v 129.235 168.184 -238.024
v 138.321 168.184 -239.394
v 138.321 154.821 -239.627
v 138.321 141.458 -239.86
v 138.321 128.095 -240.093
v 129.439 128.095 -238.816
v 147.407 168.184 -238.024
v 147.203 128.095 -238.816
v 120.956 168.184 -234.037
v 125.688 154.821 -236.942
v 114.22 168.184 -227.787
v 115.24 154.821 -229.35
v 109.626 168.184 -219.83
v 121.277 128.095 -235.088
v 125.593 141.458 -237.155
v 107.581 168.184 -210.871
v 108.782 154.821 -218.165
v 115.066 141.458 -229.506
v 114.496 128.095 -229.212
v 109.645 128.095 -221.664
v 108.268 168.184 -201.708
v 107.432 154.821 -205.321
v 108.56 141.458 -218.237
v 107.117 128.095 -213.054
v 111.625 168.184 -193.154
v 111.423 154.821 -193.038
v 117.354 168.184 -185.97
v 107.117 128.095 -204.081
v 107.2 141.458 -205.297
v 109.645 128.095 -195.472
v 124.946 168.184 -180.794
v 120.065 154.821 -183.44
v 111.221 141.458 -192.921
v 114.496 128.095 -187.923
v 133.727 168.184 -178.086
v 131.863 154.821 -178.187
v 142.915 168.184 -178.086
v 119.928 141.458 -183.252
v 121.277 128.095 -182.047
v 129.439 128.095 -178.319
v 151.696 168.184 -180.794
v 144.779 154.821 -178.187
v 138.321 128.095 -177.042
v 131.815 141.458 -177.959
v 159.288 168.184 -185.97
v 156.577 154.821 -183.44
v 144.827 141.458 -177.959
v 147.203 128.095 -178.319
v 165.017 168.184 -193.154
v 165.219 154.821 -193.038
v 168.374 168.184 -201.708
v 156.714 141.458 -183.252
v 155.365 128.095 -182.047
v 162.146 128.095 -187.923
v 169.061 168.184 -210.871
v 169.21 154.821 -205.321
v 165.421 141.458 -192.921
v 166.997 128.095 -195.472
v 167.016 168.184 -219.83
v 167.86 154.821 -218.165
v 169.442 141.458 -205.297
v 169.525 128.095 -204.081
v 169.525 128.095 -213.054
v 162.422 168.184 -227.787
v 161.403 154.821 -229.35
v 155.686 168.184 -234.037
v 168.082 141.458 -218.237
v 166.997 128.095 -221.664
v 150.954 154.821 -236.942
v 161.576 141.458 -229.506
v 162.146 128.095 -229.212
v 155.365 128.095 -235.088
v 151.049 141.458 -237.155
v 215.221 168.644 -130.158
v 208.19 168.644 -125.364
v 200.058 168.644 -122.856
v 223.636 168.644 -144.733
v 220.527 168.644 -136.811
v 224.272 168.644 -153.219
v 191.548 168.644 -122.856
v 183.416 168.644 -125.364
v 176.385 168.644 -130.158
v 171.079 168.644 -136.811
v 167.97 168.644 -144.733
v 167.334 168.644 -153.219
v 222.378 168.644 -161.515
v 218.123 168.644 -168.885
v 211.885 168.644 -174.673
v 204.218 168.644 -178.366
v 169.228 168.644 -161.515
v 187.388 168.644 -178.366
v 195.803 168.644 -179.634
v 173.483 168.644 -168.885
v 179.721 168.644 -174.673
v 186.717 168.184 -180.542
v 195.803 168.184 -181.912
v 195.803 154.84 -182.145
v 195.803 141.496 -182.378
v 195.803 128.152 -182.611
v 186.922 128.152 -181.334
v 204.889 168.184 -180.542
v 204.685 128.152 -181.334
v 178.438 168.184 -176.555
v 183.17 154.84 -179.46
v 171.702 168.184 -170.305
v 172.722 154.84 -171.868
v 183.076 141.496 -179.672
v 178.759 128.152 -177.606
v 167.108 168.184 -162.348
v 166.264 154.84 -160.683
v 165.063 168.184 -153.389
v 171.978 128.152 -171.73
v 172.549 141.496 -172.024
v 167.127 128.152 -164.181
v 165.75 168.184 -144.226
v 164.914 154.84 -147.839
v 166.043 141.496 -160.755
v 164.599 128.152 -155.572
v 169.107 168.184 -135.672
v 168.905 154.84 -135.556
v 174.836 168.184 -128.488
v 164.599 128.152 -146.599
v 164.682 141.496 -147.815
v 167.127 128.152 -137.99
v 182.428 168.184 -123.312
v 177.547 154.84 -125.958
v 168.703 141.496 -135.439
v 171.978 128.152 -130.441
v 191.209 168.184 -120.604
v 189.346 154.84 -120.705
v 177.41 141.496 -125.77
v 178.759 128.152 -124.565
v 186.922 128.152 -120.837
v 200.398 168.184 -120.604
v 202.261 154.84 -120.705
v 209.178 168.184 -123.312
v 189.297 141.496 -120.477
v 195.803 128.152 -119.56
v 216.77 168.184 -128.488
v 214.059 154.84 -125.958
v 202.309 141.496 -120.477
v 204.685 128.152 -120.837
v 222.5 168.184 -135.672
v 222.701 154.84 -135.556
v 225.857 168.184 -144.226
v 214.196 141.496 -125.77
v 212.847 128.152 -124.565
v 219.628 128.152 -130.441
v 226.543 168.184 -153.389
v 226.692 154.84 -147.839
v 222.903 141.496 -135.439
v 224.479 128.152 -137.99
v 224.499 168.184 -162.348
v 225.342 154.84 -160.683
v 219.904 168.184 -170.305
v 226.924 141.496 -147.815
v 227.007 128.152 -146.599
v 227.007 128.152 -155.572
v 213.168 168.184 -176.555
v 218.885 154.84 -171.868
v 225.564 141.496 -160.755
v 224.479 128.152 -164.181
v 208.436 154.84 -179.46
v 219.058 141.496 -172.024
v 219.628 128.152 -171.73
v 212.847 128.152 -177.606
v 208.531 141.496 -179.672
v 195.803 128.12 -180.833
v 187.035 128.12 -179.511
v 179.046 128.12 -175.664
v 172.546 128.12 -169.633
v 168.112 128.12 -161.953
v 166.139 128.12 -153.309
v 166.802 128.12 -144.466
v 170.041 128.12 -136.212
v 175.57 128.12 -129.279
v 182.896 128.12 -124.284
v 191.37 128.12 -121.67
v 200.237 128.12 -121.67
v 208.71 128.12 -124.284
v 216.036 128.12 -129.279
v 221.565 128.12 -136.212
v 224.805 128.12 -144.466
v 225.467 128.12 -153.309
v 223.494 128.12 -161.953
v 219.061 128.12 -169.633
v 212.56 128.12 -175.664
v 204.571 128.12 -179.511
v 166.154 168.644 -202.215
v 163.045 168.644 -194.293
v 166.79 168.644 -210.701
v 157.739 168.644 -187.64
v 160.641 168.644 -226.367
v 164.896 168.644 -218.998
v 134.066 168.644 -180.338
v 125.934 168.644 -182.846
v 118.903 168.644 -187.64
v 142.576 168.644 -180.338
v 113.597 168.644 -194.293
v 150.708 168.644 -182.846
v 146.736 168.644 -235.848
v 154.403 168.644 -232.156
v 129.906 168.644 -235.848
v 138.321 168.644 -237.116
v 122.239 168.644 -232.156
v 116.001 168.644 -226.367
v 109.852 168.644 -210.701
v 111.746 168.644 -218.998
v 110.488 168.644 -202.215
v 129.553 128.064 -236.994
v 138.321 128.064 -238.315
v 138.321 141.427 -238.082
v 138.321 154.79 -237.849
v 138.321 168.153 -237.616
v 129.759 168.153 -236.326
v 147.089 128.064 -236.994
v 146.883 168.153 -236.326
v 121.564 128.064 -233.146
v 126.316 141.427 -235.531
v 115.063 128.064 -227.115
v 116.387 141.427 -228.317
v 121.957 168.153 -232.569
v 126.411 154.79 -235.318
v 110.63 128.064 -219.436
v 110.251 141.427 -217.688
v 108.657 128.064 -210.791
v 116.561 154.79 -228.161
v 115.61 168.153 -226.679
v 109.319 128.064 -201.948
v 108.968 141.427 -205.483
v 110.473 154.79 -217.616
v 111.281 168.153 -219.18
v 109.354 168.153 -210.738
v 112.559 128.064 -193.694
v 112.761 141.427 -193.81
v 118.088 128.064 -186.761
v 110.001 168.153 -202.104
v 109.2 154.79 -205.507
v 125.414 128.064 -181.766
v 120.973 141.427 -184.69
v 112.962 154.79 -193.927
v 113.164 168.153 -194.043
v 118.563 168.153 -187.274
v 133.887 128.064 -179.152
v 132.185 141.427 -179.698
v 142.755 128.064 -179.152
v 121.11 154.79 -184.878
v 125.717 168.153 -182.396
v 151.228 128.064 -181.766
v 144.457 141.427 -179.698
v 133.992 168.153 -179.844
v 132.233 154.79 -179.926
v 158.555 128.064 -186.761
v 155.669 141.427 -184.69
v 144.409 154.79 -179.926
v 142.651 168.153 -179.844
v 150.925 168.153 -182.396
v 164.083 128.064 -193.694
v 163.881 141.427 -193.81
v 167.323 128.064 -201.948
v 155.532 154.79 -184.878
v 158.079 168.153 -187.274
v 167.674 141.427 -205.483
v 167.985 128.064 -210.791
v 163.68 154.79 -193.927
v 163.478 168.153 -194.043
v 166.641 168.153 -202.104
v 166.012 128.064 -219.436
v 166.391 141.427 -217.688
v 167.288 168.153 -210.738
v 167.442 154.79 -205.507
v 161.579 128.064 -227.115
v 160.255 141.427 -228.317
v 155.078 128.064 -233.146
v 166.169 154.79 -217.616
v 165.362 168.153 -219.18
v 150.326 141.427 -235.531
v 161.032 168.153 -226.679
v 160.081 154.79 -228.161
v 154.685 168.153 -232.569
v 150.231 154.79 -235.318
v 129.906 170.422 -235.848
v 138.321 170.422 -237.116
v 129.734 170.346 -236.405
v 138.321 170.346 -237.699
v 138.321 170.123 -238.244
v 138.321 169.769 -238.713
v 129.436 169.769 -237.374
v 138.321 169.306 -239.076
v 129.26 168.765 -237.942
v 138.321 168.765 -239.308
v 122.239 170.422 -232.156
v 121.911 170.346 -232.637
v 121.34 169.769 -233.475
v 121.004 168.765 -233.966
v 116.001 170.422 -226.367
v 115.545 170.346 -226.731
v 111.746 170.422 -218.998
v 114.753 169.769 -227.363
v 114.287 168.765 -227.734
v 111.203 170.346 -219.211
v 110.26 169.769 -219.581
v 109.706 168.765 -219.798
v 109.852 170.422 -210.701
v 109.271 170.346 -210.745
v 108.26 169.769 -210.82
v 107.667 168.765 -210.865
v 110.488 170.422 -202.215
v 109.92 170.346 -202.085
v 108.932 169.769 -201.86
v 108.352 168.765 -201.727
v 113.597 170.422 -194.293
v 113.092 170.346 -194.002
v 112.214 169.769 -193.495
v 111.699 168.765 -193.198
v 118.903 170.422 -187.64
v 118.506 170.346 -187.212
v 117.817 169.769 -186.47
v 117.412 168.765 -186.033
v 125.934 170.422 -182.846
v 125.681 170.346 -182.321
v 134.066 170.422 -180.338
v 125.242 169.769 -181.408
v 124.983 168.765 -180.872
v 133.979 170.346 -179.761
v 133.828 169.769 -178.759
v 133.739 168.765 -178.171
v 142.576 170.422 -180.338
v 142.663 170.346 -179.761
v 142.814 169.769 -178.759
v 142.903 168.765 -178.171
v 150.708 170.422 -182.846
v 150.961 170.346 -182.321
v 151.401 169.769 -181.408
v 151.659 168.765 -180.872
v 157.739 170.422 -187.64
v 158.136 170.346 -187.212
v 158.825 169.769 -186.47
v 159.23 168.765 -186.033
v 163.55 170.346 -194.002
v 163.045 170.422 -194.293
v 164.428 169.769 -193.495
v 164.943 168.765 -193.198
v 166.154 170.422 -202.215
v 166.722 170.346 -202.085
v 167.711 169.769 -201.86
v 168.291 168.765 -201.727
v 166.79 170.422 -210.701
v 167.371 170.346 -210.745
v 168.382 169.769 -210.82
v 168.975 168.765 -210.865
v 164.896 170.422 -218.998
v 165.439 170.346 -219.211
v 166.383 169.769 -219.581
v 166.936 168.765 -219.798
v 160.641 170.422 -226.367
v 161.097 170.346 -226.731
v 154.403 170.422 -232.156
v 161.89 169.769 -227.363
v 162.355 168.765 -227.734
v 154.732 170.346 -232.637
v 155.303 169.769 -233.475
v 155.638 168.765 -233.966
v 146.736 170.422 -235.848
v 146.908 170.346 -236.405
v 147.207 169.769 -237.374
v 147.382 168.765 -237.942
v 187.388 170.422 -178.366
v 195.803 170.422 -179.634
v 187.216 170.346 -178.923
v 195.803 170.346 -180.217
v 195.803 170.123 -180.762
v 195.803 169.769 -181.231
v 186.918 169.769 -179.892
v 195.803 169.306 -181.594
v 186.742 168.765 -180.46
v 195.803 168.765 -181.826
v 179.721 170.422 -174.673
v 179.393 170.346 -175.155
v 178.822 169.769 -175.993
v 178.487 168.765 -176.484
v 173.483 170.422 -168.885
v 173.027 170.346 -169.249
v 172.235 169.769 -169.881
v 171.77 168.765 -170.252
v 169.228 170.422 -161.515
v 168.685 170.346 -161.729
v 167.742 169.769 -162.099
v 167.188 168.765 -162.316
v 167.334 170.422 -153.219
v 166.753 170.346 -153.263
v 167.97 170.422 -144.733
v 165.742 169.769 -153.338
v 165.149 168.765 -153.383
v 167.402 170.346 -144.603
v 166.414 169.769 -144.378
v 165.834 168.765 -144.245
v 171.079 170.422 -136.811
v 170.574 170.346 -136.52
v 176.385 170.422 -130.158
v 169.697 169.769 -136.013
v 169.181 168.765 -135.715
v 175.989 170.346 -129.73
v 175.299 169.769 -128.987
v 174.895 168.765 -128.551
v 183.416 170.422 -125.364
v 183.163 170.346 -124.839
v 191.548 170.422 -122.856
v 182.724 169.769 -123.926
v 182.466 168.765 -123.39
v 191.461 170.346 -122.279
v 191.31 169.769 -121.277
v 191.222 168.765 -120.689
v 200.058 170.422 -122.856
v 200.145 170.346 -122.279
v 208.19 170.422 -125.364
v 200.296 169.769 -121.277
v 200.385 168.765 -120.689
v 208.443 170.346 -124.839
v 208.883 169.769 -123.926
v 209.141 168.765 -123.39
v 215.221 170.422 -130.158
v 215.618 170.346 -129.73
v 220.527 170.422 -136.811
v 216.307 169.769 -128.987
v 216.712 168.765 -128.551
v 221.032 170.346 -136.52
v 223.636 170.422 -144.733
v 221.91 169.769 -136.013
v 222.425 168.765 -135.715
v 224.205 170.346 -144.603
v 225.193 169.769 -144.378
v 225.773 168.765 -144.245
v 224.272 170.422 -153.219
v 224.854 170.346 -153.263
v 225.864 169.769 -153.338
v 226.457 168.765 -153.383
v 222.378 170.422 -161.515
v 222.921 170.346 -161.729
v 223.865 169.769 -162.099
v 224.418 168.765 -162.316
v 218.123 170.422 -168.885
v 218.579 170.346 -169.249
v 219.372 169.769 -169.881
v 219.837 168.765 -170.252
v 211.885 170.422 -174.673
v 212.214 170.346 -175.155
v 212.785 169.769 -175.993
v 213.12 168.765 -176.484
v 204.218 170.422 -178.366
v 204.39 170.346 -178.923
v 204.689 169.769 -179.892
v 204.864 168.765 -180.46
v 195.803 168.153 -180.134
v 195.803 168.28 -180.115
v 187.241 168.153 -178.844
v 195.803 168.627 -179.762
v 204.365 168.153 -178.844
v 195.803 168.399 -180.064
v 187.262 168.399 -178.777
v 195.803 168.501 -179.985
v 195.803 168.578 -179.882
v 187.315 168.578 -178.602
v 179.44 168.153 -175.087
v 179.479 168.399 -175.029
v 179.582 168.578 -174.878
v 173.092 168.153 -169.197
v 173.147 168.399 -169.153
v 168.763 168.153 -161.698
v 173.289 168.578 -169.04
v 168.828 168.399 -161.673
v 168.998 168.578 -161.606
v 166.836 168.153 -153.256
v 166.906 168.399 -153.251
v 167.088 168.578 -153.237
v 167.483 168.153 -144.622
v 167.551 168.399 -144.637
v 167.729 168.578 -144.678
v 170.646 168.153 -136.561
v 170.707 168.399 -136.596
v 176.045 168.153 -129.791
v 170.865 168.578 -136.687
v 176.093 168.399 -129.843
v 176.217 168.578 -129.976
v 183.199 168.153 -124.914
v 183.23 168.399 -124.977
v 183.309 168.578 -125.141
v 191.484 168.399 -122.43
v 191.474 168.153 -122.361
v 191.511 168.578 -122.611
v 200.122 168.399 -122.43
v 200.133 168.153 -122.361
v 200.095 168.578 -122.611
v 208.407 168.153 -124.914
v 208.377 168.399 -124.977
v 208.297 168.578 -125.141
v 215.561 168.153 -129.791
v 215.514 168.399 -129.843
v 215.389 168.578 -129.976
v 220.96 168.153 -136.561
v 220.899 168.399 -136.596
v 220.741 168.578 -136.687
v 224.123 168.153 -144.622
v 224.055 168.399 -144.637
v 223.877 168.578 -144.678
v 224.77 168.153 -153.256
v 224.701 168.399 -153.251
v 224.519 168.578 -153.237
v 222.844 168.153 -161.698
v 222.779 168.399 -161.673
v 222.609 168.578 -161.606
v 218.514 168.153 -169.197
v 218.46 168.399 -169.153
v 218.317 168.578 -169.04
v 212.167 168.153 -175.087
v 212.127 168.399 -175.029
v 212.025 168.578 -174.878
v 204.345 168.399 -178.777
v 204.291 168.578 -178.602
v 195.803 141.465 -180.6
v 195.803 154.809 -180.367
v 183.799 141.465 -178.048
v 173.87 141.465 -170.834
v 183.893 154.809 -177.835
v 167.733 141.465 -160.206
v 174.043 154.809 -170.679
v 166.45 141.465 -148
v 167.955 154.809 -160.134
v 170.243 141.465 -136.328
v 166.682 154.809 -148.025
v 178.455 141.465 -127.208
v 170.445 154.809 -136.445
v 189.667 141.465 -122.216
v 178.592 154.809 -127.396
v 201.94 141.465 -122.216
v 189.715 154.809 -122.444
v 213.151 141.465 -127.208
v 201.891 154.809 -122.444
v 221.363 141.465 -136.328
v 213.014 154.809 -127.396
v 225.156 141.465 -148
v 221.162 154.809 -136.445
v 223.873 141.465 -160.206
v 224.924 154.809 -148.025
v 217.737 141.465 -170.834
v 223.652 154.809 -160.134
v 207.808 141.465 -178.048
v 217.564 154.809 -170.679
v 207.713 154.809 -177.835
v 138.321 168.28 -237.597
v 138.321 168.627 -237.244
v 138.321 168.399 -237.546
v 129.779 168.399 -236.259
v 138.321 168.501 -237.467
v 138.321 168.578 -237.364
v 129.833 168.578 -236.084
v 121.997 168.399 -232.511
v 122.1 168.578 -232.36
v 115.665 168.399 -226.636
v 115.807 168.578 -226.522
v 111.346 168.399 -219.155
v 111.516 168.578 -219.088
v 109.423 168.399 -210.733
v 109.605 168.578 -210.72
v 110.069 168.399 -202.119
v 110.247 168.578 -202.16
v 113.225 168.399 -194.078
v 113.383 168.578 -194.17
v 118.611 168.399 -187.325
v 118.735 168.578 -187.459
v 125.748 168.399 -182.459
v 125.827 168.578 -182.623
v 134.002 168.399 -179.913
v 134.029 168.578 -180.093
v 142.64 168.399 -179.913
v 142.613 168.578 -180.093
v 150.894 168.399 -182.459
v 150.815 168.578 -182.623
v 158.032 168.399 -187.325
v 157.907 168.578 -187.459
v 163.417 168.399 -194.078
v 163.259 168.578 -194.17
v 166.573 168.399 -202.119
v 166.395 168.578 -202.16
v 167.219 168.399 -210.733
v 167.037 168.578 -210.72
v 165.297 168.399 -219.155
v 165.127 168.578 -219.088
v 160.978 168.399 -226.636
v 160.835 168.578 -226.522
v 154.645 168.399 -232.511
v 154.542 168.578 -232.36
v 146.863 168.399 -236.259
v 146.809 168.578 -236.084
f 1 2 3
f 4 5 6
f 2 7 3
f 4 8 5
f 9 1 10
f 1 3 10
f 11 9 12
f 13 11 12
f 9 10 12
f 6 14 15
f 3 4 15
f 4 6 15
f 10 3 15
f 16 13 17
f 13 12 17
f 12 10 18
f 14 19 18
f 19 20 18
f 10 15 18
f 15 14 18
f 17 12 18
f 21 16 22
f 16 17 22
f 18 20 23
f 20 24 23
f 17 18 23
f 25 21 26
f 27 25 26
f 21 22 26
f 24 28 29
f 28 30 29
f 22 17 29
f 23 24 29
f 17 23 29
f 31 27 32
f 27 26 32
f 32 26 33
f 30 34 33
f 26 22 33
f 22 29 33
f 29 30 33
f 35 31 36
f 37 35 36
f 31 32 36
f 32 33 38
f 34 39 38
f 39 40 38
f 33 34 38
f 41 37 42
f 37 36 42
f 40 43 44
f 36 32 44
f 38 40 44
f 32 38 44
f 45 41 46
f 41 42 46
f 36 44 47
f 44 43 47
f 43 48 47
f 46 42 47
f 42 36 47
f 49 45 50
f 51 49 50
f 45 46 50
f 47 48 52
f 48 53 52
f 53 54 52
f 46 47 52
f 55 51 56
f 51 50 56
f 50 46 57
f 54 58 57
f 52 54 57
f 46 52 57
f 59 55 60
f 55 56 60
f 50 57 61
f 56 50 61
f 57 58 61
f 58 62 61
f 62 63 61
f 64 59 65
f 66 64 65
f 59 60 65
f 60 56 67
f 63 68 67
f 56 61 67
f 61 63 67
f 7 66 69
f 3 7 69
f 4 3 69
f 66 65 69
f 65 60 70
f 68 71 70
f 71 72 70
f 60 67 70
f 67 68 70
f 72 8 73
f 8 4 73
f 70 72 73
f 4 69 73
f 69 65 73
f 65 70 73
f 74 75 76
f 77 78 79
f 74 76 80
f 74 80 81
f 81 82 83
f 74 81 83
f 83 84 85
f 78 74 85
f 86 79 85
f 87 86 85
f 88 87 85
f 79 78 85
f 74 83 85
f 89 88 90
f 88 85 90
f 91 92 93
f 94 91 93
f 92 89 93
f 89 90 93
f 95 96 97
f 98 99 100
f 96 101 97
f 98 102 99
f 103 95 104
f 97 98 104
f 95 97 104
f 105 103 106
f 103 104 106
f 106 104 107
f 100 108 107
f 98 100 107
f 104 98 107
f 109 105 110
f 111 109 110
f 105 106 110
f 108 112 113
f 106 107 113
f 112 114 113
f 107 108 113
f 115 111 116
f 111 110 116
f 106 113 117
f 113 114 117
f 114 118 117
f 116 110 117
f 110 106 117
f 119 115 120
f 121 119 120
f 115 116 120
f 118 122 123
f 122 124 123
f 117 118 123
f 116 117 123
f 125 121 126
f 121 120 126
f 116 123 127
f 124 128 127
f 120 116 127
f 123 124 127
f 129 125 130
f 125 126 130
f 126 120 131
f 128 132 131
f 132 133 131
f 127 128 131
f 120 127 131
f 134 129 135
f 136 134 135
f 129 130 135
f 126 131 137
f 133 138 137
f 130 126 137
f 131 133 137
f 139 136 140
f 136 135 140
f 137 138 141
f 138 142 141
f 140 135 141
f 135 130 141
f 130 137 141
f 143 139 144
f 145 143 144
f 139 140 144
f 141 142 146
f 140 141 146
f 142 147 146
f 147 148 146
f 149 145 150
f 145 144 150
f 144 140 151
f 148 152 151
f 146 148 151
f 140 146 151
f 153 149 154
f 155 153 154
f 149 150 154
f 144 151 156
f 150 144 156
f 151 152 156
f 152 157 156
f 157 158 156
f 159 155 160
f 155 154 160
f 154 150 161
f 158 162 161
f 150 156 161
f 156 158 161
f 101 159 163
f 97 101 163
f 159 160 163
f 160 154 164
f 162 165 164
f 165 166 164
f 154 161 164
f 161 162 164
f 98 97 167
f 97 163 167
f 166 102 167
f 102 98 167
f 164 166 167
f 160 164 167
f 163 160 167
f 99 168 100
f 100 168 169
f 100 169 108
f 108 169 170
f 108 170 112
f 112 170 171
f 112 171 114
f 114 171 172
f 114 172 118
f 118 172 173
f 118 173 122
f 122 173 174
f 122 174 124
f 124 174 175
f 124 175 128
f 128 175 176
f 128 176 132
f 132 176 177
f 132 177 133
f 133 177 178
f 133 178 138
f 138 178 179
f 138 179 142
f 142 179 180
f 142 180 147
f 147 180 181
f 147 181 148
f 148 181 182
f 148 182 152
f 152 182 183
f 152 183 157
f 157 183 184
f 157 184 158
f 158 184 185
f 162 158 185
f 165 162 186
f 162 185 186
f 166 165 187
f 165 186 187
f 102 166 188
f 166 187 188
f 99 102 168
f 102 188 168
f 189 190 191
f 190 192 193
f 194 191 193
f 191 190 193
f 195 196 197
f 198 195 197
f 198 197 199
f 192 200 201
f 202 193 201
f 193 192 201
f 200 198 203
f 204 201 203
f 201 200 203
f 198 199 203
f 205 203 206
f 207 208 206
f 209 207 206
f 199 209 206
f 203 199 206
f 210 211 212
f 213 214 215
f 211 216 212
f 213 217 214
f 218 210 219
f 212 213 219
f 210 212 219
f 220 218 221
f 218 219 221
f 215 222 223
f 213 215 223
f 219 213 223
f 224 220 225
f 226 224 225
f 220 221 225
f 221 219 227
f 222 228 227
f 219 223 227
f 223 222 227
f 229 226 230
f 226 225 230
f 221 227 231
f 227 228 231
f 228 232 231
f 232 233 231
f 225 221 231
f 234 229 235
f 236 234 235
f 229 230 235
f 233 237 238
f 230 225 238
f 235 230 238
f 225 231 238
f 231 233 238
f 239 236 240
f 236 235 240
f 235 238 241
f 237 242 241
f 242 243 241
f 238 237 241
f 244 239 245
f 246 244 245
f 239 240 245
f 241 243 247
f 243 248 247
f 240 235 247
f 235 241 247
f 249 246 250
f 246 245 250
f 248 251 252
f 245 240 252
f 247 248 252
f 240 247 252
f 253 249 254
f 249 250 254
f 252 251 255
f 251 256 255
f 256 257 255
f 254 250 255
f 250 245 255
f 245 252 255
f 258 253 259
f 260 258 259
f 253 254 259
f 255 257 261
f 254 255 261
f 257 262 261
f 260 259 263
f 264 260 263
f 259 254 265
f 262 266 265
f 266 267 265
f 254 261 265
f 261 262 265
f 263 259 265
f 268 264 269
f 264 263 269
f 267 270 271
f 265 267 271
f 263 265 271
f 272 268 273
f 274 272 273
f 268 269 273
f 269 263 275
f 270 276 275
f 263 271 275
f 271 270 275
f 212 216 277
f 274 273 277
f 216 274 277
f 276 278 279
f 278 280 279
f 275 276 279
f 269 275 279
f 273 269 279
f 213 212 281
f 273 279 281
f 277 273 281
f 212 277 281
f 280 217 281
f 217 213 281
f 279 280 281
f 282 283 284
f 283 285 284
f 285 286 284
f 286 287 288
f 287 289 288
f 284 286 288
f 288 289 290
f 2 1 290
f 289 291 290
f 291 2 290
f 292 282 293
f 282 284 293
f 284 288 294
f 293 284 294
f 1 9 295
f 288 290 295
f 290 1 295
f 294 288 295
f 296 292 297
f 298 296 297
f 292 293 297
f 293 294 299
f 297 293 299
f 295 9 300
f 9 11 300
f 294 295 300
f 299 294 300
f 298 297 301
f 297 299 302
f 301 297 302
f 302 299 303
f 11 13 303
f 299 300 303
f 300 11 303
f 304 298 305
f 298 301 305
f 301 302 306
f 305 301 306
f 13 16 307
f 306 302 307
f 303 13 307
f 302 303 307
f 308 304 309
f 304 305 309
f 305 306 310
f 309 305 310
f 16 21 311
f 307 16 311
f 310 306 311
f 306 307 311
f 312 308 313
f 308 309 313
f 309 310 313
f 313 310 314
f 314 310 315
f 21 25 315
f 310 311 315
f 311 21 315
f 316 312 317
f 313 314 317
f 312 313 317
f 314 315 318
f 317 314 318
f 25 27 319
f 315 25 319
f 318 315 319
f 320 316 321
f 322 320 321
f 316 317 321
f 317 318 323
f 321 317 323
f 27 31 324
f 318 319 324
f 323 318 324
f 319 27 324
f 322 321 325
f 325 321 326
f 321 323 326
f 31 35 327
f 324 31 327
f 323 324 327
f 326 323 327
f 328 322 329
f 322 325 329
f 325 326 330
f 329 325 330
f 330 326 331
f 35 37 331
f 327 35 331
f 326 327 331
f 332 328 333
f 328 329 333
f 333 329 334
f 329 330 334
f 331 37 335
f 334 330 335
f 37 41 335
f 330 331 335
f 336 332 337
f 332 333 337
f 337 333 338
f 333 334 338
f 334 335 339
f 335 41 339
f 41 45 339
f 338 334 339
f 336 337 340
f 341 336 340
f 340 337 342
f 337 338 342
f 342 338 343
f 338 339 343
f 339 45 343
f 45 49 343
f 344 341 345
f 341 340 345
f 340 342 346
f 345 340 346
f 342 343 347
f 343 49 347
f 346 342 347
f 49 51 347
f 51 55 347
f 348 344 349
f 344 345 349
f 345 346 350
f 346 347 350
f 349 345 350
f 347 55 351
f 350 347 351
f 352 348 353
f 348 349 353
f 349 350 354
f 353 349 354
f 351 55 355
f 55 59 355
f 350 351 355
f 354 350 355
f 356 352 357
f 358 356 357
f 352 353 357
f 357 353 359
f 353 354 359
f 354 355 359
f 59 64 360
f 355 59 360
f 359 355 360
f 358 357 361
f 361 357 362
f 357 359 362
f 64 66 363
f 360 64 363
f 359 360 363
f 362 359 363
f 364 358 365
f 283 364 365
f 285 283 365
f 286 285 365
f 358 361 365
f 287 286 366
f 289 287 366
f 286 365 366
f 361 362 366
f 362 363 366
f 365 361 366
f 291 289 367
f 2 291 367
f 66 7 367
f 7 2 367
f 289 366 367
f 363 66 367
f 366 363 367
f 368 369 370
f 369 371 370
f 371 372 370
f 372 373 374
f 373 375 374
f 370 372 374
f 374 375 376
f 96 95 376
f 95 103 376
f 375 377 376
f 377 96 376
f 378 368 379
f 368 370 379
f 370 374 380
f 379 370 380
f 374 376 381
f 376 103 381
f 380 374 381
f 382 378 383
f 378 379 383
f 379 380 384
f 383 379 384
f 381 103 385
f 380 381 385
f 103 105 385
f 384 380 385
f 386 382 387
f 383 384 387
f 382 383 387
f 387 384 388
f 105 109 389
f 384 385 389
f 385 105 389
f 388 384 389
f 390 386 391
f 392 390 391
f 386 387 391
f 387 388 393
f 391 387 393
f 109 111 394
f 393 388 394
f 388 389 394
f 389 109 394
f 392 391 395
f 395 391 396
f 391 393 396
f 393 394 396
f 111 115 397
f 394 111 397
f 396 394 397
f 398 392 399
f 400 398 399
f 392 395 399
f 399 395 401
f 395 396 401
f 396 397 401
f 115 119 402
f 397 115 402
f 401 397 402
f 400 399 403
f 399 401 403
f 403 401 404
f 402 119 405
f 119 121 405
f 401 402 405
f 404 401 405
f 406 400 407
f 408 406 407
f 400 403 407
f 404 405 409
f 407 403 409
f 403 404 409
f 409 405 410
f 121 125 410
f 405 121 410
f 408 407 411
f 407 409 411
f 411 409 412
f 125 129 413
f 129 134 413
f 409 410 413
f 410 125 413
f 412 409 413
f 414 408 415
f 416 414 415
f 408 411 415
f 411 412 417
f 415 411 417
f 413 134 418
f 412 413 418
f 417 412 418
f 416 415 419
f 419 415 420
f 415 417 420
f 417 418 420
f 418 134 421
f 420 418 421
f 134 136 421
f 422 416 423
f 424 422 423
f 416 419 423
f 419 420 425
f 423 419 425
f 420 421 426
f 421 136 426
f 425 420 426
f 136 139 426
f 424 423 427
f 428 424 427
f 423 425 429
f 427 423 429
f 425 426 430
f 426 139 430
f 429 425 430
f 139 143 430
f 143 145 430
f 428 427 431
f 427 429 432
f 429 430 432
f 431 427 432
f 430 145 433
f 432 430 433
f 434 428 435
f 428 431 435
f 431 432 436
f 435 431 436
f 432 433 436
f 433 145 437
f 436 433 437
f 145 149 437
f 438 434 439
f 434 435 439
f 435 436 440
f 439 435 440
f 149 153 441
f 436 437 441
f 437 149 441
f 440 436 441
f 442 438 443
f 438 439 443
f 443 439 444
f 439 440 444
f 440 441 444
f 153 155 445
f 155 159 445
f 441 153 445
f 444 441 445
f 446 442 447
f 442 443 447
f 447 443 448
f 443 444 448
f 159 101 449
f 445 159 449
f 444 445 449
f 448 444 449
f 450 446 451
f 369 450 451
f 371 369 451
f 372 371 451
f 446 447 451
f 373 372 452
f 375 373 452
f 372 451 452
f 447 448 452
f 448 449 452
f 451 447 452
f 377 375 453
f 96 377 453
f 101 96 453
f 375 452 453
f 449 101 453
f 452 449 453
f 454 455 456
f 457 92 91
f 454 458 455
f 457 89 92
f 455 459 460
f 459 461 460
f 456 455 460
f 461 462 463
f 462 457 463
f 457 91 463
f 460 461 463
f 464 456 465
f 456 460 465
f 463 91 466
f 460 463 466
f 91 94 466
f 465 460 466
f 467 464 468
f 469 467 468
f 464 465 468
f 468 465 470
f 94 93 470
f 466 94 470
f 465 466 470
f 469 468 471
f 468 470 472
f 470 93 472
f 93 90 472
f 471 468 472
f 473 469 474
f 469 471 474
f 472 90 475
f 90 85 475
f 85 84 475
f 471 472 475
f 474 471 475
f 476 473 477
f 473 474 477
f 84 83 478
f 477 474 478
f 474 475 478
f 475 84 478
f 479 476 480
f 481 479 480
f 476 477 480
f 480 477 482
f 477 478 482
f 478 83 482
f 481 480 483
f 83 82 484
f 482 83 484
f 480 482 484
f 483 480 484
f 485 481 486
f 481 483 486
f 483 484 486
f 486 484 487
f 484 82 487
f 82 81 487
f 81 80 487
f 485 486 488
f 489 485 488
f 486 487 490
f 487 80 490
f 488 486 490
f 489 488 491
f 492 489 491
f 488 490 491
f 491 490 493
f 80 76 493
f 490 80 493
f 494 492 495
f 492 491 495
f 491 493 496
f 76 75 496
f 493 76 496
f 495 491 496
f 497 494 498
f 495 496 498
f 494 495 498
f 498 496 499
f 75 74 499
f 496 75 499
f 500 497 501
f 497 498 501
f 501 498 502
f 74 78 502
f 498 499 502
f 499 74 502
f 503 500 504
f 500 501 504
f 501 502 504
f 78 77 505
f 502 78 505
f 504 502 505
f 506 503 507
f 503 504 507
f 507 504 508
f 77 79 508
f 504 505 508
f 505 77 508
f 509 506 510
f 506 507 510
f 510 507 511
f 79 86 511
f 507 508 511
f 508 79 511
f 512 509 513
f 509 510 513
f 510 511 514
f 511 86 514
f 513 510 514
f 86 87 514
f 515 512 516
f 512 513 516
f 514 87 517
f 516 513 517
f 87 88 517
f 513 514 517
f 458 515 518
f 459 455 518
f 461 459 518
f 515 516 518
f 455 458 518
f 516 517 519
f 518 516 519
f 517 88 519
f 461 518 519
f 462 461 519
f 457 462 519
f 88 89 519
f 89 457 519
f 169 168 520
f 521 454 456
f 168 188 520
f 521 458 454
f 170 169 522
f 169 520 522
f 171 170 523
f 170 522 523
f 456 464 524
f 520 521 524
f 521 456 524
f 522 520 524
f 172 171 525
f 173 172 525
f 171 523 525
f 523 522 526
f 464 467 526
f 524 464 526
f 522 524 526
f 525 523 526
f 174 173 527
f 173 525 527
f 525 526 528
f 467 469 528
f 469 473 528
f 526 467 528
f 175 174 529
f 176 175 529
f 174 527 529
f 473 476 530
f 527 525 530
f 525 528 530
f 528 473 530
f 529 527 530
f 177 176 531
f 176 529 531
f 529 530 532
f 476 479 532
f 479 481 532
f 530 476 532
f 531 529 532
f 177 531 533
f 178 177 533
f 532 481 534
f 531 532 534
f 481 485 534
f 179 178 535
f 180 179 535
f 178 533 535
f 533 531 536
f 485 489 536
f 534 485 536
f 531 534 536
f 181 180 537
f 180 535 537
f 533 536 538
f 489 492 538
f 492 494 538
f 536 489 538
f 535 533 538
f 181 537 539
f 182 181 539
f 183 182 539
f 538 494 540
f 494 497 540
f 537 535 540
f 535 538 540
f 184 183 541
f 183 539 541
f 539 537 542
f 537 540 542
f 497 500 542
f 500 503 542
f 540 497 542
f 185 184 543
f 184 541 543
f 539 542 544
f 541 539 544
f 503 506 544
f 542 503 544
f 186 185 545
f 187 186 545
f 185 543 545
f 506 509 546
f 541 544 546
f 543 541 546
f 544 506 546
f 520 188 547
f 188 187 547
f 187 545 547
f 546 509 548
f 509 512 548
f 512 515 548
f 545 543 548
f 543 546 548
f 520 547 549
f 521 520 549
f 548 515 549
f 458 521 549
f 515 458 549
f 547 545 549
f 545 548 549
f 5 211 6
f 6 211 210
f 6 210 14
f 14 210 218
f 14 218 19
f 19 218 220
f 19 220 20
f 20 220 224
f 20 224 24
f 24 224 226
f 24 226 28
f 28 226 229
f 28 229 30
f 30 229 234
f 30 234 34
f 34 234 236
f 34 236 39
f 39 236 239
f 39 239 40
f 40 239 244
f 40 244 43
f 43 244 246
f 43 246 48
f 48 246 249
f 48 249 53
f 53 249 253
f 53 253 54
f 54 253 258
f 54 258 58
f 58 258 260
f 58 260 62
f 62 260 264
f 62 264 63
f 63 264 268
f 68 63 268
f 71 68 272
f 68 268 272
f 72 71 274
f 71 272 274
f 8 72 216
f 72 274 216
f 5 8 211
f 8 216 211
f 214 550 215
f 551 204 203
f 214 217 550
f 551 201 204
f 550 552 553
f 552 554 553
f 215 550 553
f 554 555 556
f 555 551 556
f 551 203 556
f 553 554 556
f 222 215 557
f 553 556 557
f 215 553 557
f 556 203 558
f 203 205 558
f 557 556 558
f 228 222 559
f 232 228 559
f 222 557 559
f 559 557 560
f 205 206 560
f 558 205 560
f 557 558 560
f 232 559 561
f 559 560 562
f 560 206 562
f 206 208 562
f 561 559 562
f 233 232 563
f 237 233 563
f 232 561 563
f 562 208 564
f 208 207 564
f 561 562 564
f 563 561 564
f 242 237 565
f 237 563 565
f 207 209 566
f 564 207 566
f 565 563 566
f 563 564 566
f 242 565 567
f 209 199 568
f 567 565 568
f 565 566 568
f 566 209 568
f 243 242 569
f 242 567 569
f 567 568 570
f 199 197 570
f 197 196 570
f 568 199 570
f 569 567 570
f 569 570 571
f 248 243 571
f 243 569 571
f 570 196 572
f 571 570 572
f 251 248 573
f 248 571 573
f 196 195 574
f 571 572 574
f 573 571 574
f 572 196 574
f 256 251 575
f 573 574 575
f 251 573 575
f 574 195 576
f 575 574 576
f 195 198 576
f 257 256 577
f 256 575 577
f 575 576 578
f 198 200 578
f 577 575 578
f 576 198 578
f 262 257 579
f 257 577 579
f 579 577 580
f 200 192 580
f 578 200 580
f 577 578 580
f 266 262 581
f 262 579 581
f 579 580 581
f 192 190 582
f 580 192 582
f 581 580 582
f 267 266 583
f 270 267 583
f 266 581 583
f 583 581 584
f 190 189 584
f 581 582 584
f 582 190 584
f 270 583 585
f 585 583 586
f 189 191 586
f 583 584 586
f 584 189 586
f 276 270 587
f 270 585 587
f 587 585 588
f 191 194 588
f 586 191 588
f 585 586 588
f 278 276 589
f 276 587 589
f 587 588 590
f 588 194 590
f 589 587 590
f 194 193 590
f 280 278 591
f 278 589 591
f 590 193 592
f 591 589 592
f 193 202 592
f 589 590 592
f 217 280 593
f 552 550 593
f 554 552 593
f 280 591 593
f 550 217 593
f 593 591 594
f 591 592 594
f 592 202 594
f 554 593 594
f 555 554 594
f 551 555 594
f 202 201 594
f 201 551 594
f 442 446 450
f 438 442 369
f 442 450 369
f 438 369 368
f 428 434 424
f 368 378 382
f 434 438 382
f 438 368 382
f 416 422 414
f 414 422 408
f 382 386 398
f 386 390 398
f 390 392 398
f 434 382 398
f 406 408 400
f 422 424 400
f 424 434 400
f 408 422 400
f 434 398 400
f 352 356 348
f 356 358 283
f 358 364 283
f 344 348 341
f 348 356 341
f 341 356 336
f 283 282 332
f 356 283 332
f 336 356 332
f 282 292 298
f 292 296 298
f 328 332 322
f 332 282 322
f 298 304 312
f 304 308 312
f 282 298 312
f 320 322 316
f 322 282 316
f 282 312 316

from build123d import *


with BuildPart() as part:
    # Sketch3 → Revolve1 (revolve)
    with BuildSketch(Plane(origin=(173.444343939, 0, -173.444343939), x_dir=(-0.7071067811865471, 0, -0.707106781186548), z_dir=(0.707106781186548, 0, -0.7071067811865471)), mode=Mode.PRIVATE) as revolve1_sk:
        with BuildLine():
            Line((-61.367469068, 128.12049189), (-60.66870568, 168.152619588))
            ThreePointArc((-60.66870568, 168.152619588), (-60.519236464, 168.50051861), (-60.168781832, 168.643893385))
            Line((-60.168781832, 168.643893385), (-31.620159035, 168.643893385))
            Line((-31.620159035, 168.643893385), (-31.620159035, 170.421893385))
            Line((-31.620159035, 170.421893385), (-60.168781832, 170.421893385))
            ThreePointArc((-60.168781832, 170.421893385), (-61.765453136, 169.768677908), (-62.446434882, 168.183649967))
            Line((-62.446434882, 168.183649967), (-63.14519827, 128.151522268))
            Line((-63.14519827, 128.151522268), (-61.367469068, 128.12049189))
        make_face()
    revolve(revolve1_sk.sketch.rotate(Axis((195.803172815, 170.421893385, -151.085515063), (0, 1, 0)), 135), axis=Axis((195.803172815, 170.421893385, -151.085515063), (0, 1, 0)))


with BuildPart() as body_2:
    # Sketch4 → Revolve2 (revolve)
    with BuildSketch(Plane(origin=(173.444343939, 0, -173.444343939), x_dir=(-0.7071067811865471, 0, -0.707106781186548), z_dir=(0.707106781186548, 0, -0.7071067811865471)), mode=Mode.PRIVATE) as revolve2_sk:
        with BuildLine():
            Line((19.924253169, 128.063996333), (20.623271577, 168.152619588))
            ThreePointArc((20.623271577, 168.152619588), (20.772740793, 168.50051861), (21.123195425, 168.643893385))
            Line((21.123195425, 168.643893385), (49.671818222, 168.643893385))
            Line((49.671818222, 168.643893385), (49.671818222, 170.421893385))
            Line((49.671818222, 170.421893385), (21.123195425, 170.421893385))
            ThreePointArc((21.123195425, 170.421893385), (19.526518341, 169.768672228), (18.845542093, 168.183633761))
            Line((18.845542093, 168.183633761), (18.146523402, 128.0949943))
            Line((18.146523402, 128.0949943), (19.924253169, 128.063996333))
        make_face()
    revolve(revolve2_sk.sketch.rotate(Axis((138.32106444, 168.643893385, -208.567623438), (0, 1, 0)), 135), axis=Axis((138.32106444, 168.643893385, -208.567623438), (0, 1, 0)))


solid = Compound([part.part, body_2.part])
